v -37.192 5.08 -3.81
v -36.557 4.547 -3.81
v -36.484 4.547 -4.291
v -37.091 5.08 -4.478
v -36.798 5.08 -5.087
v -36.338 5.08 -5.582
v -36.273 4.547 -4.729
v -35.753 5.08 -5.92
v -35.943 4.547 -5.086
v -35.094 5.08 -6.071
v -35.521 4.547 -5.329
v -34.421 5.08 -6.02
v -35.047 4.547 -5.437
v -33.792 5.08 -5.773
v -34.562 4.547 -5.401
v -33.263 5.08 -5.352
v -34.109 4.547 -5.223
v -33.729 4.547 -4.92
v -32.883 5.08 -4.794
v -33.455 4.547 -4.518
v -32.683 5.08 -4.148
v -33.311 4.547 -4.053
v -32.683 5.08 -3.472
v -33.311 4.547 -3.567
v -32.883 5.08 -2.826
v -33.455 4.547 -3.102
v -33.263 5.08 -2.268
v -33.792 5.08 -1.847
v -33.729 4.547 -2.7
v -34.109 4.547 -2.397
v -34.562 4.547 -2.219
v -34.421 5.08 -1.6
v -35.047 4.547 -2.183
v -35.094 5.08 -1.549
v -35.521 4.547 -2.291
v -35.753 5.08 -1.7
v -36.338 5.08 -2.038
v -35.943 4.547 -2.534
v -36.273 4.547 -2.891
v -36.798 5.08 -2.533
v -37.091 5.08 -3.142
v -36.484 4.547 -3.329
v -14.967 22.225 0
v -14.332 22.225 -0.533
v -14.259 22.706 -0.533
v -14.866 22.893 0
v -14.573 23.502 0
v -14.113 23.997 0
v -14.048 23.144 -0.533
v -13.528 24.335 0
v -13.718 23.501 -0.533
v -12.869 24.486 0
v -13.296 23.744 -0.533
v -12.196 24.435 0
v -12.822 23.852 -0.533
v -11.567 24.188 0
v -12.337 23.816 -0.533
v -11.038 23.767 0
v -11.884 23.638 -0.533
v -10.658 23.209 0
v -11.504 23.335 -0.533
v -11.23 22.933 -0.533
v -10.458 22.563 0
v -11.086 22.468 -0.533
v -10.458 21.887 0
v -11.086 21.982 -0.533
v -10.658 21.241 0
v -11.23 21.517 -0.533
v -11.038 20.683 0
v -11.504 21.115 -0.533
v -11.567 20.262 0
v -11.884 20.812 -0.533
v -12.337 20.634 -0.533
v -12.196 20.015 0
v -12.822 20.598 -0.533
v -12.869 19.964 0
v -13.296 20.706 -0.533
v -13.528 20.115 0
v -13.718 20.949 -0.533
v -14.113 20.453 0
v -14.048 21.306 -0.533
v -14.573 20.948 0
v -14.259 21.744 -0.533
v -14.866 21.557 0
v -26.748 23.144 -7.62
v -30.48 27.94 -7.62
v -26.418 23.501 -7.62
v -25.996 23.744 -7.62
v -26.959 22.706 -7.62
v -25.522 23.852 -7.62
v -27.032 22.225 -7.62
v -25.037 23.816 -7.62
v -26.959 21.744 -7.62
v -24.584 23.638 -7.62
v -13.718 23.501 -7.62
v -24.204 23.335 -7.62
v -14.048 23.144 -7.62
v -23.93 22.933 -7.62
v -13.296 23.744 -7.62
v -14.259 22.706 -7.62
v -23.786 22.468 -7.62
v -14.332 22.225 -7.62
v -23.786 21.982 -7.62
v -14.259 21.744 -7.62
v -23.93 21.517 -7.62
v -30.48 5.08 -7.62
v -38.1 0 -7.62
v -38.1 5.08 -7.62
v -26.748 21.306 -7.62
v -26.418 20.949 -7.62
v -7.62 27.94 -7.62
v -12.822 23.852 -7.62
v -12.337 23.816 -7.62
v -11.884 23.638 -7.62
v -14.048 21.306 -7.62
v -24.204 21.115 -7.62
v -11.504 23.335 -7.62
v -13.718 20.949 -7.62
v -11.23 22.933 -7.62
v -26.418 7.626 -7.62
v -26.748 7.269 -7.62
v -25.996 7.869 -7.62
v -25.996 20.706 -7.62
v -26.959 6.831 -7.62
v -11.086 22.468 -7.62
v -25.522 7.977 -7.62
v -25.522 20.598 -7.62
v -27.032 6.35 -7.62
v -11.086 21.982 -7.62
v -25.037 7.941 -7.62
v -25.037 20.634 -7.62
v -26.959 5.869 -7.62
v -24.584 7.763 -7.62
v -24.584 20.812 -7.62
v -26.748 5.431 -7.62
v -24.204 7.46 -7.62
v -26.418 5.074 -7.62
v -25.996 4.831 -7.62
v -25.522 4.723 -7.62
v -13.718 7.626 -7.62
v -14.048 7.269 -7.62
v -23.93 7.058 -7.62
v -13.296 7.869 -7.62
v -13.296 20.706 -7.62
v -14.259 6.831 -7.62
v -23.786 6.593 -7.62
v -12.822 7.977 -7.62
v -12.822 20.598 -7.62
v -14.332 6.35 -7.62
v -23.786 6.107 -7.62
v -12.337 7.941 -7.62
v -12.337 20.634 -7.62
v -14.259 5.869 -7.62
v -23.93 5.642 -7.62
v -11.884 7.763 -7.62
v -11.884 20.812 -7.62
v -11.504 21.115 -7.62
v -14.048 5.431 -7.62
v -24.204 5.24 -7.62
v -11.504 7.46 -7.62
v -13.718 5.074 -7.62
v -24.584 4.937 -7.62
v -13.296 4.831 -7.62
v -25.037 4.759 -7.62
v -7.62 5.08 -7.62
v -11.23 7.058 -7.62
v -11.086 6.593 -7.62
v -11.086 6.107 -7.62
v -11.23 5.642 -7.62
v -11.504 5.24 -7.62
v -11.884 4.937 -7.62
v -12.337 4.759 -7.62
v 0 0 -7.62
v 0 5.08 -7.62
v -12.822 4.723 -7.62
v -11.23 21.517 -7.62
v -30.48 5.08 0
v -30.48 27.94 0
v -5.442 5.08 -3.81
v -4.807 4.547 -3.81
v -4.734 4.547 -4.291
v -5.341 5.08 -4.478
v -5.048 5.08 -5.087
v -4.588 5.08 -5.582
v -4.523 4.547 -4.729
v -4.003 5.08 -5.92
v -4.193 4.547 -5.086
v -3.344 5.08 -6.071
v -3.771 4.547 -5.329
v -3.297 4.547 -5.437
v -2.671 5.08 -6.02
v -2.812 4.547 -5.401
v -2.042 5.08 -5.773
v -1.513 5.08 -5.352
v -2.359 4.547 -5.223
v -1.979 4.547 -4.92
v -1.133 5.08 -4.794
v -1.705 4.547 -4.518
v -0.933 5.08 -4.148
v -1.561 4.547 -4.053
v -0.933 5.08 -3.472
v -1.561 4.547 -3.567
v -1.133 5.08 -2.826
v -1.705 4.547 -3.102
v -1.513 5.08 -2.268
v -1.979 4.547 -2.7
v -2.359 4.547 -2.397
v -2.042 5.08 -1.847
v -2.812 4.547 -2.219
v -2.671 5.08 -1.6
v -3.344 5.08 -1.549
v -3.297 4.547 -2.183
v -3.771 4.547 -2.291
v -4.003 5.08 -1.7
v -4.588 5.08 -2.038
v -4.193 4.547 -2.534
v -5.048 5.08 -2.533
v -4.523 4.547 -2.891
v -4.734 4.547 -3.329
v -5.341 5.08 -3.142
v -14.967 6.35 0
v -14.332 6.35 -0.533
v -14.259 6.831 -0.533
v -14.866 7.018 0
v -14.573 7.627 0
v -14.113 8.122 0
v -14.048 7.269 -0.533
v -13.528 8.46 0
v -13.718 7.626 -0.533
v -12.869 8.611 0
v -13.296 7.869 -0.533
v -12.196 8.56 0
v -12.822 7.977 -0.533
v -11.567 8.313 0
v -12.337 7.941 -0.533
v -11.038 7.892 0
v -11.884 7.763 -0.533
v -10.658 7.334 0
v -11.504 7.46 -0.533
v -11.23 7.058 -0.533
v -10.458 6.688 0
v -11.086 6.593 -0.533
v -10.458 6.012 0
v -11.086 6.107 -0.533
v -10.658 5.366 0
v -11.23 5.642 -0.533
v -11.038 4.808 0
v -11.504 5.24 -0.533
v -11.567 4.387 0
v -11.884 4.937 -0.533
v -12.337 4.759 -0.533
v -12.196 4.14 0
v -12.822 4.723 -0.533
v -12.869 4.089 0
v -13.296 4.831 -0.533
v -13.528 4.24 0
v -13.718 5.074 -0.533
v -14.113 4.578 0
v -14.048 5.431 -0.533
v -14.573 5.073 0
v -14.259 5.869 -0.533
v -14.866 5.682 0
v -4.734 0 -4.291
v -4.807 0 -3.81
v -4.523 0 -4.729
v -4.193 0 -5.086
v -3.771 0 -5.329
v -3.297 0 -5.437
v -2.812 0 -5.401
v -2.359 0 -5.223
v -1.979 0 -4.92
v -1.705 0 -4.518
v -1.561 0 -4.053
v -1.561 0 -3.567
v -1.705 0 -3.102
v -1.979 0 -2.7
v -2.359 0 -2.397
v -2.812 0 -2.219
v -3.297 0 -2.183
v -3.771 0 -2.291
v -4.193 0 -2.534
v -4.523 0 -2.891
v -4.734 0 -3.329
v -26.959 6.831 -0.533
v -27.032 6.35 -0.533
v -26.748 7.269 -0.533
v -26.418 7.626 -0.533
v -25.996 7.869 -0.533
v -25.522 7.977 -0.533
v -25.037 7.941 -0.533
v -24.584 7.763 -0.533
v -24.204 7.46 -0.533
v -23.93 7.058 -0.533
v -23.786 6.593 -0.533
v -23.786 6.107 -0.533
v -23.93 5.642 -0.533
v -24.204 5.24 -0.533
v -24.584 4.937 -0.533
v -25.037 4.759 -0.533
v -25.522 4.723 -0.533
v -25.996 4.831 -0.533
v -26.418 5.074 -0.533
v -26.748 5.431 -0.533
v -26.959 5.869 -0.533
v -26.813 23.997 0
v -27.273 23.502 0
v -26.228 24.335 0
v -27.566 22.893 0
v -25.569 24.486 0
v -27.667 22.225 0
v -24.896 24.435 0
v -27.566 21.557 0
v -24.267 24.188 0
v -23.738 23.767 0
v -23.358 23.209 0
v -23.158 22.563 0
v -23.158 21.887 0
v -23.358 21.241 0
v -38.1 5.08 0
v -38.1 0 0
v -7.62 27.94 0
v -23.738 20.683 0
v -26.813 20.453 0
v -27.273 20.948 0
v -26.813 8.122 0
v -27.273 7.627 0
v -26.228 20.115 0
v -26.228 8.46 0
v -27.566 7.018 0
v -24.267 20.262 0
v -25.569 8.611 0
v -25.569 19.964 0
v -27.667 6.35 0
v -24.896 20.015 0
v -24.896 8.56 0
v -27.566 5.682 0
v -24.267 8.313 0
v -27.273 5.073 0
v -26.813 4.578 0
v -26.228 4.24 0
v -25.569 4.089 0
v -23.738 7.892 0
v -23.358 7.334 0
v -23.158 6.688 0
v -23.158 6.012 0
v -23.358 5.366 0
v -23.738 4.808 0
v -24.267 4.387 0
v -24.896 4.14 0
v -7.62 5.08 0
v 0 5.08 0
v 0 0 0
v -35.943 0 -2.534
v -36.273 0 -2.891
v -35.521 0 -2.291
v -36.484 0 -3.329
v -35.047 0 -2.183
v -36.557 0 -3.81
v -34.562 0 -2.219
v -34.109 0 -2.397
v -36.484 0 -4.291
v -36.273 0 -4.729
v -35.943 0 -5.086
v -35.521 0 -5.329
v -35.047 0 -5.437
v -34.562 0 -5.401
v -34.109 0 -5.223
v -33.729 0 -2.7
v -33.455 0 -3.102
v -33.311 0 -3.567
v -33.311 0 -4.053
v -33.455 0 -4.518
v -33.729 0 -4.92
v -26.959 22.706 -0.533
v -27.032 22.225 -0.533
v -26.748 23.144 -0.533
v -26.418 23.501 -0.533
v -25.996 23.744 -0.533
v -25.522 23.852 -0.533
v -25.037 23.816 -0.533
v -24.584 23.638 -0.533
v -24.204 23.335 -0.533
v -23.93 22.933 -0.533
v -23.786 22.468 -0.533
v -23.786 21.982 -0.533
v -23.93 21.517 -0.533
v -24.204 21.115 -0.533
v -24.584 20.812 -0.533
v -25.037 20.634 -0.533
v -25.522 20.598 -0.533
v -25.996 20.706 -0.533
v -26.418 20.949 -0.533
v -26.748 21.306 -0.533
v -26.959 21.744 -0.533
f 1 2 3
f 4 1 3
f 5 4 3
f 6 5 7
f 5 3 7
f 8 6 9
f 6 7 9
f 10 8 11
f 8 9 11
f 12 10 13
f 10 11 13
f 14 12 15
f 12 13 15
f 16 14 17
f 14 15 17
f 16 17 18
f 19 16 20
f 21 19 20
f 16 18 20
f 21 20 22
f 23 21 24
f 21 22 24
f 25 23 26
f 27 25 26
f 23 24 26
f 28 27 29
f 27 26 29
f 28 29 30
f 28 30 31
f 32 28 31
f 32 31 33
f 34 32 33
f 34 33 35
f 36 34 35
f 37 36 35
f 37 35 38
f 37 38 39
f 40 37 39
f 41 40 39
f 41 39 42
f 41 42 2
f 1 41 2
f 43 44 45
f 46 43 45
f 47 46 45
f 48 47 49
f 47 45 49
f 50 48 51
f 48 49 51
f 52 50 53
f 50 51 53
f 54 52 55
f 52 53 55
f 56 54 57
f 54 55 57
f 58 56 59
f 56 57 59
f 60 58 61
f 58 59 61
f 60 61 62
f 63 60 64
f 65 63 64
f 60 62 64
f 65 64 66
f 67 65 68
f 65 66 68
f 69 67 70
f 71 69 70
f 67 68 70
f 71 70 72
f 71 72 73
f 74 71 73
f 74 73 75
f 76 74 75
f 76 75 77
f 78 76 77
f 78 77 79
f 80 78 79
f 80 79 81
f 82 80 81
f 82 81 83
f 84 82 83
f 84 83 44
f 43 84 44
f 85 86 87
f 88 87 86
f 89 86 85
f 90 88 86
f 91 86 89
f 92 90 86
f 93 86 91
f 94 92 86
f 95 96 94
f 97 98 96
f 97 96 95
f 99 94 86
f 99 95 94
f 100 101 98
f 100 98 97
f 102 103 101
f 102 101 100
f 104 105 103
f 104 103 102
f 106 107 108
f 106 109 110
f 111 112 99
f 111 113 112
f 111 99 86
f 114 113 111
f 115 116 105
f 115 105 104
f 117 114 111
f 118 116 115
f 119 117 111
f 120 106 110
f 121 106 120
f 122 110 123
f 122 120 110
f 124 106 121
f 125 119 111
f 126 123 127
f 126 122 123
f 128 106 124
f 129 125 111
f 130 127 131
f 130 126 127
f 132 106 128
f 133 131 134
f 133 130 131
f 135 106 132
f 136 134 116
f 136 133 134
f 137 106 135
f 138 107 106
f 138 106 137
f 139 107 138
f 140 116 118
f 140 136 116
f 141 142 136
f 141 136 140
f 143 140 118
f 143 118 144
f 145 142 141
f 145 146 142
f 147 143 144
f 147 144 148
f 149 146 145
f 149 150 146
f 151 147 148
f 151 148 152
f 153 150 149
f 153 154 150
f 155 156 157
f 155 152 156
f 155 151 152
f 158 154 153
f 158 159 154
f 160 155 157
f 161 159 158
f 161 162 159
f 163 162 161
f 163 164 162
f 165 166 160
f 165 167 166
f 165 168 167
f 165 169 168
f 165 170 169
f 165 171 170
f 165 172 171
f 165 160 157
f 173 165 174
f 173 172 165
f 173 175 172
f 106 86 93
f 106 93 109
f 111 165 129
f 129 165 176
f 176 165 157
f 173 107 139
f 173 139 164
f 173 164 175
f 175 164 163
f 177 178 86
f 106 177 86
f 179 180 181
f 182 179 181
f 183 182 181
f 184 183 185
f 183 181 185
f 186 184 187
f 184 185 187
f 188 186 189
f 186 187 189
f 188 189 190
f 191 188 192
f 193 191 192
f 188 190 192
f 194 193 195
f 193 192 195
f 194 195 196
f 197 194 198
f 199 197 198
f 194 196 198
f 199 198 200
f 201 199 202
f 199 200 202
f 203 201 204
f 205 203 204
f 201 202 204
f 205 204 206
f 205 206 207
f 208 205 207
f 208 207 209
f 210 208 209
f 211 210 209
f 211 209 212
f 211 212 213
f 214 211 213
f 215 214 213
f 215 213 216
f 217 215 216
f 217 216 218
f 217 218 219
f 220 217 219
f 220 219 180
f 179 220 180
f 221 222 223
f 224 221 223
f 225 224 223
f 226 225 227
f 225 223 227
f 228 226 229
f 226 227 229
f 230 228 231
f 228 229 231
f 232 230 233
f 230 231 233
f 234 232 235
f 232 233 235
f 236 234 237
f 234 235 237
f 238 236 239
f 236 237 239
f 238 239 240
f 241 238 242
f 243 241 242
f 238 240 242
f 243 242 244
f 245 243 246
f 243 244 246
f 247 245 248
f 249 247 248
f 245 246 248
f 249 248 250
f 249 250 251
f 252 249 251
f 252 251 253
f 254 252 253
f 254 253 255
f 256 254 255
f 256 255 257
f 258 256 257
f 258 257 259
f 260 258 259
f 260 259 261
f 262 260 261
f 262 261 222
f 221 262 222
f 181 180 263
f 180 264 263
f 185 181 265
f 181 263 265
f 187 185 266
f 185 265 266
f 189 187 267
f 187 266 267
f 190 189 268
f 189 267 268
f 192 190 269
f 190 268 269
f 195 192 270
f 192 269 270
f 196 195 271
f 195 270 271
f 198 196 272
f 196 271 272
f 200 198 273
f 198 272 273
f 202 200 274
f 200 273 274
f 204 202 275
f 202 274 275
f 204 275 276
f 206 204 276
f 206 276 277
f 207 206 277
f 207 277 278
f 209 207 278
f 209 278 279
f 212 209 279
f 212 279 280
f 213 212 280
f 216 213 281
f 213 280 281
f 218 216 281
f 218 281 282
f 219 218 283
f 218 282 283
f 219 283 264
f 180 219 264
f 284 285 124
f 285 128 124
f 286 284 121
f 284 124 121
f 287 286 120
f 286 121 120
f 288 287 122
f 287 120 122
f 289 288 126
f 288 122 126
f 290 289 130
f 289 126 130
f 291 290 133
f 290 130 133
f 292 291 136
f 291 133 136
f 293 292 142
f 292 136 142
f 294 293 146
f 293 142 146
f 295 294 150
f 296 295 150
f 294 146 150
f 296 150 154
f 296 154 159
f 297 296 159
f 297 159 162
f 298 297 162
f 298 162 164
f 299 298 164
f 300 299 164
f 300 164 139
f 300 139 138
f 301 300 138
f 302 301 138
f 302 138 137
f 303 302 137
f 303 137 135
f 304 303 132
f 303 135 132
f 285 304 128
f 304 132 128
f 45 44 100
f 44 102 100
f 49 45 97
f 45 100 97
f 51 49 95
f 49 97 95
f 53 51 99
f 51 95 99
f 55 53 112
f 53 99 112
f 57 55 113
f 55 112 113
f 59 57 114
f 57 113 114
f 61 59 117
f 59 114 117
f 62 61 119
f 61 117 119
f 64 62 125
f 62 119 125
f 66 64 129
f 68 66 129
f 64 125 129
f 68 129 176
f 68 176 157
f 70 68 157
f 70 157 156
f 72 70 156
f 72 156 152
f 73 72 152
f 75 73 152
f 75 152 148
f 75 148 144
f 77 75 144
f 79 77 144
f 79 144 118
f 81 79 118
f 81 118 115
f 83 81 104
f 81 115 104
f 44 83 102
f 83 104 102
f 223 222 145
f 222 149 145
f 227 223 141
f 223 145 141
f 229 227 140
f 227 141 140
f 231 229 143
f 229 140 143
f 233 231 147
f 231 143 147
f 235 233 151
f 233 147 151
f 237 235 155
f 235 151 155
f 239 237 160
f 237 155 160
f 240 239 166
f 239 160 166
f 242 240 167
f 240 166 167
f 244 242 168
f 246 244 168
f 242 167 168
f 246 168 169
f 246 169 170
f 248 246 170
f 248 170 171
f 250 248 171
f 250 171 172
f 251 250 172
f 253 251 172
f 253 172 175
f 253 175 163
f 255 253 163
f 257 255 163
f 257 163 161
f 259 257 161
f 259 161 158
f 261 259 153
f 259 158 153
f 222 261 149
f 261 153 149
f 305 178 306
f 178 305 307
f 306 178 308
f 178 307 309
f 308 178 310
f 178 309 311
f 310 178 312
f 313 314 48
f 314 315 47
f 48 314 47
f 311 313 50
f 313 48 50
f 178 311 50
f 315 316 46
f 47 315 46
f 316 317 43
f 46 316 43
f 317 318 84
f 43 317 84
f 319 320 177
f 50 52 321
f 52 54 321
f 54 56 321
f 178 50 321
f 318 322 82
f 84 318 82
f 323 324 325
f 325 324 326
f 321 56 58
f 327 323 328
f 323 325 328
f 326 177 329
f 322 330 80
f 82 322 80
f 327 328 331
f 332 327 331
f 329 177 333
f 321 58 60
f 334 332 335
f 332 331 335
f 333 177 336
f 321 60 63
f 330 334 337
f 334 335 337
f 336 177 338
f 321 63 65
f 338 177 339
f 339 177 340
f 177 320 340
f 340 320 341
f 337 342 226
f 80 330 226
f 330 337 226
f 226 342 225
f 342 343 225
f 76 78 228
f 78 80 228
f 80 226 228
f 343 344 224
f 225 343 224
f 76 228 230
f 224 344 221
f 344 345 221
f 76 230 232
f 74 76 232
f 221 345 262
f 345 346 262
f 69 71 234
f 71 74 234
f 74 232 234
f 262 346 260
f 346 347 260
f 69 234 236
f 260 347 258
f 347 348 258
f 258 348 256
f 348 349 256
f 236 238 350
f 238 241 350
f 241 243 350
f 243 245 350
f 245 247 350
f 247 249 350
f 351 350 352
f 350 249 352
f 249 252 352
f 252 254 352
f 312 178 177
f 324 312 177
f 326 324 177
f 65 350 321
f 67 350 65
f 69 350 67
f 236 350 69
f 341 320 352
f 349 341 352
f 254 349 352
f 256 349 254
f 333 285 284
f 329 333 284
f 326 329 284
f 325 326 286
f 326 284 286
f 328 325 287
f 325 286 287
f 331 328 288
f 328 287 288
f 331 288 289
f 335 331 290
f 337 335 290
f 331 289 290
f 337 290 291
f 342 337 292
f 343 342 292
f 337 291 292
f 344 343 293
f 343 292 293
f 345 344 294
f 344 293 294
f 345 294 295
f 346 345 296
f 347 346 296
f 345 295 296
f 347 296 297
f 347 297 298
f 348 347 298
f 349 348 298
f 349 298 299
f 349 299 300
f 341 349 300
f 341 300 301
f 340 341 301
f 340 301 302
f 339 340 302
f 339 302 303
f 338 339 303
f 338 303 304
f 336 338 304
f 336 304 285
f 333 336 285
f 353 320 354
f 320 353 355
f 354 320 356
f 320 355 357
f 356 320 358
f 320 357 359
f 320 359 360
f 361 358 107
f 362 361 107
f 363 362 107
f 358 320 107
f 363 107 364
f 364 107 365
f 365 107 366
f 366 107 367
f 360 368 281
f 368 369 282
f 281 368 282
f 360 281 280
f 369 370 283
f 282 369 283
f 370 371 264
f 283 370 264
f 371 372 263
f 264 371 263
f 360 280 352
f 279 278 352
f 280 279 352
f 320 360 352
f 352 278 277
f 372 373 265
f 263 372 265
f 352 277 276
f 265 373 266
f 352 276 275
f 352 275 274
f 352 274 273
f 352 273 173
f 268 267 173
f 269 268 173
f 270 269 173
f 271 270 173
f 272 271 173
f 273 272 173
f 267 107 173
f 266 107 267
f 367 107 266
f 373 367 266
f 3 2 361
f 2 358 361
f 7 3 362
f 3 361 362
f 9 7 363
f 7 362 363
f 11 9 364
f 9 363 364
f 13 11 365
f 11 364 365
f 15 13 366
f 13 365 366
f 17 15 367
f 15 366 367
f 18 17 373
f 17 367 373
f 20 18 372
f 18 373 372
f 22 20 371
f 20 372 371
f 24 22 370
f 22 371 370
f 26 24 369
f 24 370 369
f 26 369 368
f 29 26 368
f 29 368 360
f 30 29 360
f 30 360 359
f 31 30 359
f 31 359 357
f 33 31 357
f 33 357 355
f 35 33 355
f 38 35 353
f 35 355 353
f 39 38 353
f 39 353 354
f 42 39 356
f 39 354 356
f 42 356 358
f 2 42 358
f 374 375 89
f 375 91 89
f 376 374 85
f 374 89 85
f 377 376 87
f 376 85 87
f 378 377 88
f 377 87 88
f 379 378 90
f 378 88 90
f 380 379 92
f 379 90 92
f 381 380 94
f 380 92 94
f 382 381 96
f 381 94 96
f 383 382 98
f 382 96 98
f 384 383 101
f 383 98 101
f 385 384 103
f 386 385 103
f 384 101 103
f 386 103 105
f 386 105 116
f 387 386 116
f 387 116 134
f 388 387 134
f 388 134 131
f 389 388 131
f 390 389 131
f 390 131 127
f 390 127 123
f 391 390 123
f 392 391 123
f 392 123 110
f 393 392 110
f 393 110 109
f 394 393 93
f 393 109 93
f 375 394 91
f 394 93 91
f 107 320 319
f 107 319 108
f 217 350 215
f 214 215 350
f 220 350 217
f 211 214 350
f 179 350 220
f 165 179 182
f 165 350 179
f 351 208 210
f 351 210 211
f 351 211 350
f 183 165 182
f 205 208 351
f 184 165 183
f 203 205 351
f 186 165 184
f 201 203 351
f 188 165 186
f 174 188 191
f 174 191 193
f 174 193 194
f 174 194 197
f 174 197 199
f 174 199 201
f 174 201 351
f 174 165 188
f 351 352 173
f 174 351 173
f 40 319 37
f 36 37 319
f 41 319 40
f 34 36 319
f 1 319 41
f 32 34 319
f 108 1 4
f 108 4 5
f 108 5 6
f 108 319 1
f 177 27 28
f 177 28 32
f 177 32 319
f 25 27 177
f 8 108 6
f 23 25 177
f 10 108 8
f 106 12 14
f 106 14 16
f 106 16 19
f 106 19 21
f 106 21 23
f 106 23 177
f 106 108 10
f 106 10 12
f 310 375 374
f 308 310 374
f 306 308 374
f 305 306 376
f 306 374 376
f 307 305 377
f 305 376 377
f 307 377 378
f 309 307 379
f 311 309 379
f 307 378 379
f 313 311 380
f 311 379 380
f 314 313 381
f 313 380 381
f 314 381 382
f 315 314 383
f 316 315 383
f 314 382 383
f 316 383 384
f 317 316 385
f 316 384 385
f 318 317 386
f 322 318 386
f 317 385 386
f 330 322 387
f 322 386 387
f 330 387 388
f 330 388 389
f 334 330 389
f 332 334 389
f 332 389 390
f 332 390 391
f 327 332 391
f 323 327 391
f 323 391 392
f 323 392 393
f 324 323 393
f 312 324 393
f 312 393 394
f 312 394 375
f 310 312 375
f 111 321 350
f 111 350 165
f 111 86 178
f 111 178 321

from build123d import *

# Parameters (mm, degrees)
SKETCH1_W                       = 38.1
SKETCH1_H                       = 7.62
BOSS_EXTRUDE1_DEPTH             = 5.08
SKETCH2_W                       = 22.86
SKETCH2_H                       = 7.62
BOSS_EXTRUDE2_DEPTH             = 22.86
F_4_CLEARANCE_HOLE1_D           = 3.2639
F_4_CLEARANCE_HOLE1_CSINK_D     = 4.5339
F_4_CLEARANCE_HOLE1_CSINK_ANGLE = 100
F_4_CLEARANCE_HOLE2_D           = 3.2639
F_4_CLEARANCE_HOLE2_CSINK_D     = 4.5339
F_4_CLEARANCE_HOLE2_CSINK_ANGLE = 100


with BuildPart() as part:
    # Sketch1 → Boss-Extrude1 (new body)
    with BuildSketch(Plane(origin=(0, 0, 0), x_dir=(1, 0, 0), z_dir=(0, 1, 0))):
        with Locations((-19.05, 3.81)):
            Rectangle(SKETCH1_W, SKETCH1_H)
    extrude(amount=BOSS_EXTRUDE1_DEPTH)

    # Sketch2 → Boss-Extrude2 (add)
    with BuildSketch(Plane(origin=(0, 5.08, 0), x_dir=(1, 0, 0), z_dir=(0, 1, 0))):
        with Locations((-19.05, 3.81)):
            Rectangle(SKETCH2_W, SKETCH2_H)
    extrude(amount=BOSS_EXTRUDE2_DEPTH)

    # #4 Clearance Hole1 (through all)
    with Locations(Plane(origin=(-25.4, 6.35, 0), x_dir=(1, 0, 0), z_dir=(0, 0, 1))):
        with Locations((0, 0), (0, 15.875), (12.7, 15.875), (12.7, 0)):
            CounterSinkHole(F_4_CLEARANCE_HOLE1_D / 2, F_4_CLEARANCE_HOLE1_CSINK_D / 2, counter_sink_angle=F_4_CLEARANCE_HOLE1_CSINK_ANGLE)

    # #4 Clearance Hole2 (through all)
    with Locations(Plane(origin=(0, 5.08, 0), x_dir=(1, 0, 0), z_dir=(0, 1, 0))):
        with Locations((-34.925, 3.81), (-3.175, 3.81)):
            CounterSinkHole(F_4_CLEARANCE_HOLE2_D / 2, F_4_CLEARANCE_HOLE2_CSINK_D / 2, counter_sink_angle=F_4_CLEARANCE_HOLE2_CSINK_ANGLE)


solid = part.part
